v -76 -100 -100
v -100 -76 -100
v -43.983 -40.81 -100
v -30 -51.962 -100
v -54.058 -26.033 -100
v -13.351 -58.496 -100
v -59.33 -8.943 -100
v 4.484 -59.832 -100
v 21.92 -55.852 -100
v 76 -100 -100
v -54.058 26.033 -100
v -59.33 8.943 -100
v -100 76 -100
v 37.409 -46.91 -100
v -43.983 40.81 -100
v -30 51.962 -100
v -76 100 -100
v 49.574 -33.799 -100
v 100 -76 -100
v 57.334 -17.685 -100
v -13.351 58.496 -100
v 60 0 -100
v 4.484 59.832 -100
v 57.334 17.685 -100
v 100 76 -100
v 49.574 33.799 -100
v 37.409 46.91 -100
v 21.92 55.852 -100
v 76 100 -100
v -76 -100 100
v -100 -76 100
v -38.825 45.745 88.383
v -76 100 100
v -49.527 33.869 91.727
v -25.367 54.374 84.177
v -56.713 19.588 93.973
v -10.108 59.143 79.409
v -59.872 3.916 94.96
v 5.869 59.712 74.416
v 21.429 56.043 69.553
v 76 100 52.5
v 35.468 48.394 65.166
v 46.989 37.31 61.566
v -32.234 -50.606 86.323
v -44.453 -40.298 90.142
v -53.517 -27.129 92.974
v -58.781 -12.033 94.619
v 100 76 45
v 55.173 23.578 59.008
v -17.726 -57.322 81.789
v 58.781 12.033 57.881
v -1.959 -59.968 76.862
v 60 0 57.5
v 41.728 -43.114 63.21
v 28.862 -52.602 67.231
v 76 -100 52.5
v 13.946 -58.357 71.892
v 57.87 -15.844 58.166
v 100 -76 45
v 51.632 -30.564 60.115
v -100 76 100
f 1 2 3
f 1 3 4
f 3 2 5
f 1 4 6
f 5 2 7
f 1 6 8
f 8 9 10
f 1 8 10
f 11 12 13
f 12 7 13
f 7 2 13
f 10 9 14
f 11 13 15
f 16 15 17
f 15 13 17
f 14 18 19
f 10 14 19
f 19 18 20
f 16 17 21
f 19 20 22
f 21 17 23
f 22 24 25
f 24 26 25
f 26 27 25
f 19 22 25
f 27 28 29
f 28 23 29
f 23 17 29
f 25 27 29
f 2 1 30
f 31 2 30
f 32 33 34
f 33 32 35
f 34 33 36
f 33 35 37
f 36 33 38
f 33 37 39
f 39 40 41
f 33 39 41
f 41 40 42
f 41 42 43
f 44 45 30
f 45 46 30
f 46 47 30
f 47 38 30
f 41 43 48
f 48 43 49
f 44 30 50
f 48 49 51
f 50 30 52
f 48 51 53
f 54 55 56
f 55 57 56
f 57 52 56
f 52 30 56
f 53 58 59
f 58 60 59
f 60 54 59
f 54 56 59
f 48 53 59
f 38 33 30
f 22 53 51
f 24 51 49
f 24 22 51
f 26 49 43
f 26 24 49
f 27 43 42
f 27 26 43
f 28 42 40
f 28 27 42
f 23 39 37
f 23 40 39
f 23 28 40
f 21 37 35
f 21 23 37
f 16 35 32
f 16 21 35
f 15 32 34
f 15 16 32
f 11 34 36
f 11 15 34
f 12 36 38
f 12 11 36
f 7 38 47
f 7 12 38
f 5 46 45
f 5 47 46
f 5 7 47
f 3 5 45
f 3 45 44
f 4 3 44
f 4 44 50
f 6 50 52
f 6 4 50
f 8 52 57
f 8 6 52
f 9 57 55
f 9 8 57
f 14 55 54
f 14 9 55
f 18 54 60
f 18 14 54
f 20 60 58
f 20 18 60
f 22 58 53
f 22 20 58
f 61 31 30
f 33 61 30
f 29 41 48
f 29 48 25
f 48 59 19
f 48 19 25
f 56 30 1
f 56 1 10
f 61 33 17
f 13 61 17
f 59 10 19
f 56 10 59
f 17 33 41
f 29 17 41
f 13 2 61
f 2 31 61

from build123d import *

# Parameters (mm, degrees)
F0_W     = 200
F0_H     = 200
F0_R     = 60
F1_DEPTH = 100
F2_SIZE  = 24
F4_DEPTH = 200


with BuildPart() as f1:
    # F0 (on Top) → F1 (new body, symmetric)
    with BuildSketch(Plane.XY):
        Rectangle(F0_W, F0_H)
        Circle(F0_R, mode=Mode.SUBTRACT)
    extrude(amount=F1_DEPTH, both=True)

    # F2
    f2_edges = [f1.edges().sort_by_distance(p)[0] for p in [
        (-100, -100, 0),
        (100, -100, 0),
        (100, 100, 0),
        (-100, 100, 0),
    ]]
    chamfer(f2_edges, length=F2_SIZE)

    # F3 (on face) → F4 (cut)
    with BuildSketch(Plane.XZ.offset(100)):
        Polygon((100, 45), (100, 100), (-76, 100), align=None)
    extrude(amount=-F4_DEPTH, mode=Mode.SUBTRACT)


solid = f1.part
